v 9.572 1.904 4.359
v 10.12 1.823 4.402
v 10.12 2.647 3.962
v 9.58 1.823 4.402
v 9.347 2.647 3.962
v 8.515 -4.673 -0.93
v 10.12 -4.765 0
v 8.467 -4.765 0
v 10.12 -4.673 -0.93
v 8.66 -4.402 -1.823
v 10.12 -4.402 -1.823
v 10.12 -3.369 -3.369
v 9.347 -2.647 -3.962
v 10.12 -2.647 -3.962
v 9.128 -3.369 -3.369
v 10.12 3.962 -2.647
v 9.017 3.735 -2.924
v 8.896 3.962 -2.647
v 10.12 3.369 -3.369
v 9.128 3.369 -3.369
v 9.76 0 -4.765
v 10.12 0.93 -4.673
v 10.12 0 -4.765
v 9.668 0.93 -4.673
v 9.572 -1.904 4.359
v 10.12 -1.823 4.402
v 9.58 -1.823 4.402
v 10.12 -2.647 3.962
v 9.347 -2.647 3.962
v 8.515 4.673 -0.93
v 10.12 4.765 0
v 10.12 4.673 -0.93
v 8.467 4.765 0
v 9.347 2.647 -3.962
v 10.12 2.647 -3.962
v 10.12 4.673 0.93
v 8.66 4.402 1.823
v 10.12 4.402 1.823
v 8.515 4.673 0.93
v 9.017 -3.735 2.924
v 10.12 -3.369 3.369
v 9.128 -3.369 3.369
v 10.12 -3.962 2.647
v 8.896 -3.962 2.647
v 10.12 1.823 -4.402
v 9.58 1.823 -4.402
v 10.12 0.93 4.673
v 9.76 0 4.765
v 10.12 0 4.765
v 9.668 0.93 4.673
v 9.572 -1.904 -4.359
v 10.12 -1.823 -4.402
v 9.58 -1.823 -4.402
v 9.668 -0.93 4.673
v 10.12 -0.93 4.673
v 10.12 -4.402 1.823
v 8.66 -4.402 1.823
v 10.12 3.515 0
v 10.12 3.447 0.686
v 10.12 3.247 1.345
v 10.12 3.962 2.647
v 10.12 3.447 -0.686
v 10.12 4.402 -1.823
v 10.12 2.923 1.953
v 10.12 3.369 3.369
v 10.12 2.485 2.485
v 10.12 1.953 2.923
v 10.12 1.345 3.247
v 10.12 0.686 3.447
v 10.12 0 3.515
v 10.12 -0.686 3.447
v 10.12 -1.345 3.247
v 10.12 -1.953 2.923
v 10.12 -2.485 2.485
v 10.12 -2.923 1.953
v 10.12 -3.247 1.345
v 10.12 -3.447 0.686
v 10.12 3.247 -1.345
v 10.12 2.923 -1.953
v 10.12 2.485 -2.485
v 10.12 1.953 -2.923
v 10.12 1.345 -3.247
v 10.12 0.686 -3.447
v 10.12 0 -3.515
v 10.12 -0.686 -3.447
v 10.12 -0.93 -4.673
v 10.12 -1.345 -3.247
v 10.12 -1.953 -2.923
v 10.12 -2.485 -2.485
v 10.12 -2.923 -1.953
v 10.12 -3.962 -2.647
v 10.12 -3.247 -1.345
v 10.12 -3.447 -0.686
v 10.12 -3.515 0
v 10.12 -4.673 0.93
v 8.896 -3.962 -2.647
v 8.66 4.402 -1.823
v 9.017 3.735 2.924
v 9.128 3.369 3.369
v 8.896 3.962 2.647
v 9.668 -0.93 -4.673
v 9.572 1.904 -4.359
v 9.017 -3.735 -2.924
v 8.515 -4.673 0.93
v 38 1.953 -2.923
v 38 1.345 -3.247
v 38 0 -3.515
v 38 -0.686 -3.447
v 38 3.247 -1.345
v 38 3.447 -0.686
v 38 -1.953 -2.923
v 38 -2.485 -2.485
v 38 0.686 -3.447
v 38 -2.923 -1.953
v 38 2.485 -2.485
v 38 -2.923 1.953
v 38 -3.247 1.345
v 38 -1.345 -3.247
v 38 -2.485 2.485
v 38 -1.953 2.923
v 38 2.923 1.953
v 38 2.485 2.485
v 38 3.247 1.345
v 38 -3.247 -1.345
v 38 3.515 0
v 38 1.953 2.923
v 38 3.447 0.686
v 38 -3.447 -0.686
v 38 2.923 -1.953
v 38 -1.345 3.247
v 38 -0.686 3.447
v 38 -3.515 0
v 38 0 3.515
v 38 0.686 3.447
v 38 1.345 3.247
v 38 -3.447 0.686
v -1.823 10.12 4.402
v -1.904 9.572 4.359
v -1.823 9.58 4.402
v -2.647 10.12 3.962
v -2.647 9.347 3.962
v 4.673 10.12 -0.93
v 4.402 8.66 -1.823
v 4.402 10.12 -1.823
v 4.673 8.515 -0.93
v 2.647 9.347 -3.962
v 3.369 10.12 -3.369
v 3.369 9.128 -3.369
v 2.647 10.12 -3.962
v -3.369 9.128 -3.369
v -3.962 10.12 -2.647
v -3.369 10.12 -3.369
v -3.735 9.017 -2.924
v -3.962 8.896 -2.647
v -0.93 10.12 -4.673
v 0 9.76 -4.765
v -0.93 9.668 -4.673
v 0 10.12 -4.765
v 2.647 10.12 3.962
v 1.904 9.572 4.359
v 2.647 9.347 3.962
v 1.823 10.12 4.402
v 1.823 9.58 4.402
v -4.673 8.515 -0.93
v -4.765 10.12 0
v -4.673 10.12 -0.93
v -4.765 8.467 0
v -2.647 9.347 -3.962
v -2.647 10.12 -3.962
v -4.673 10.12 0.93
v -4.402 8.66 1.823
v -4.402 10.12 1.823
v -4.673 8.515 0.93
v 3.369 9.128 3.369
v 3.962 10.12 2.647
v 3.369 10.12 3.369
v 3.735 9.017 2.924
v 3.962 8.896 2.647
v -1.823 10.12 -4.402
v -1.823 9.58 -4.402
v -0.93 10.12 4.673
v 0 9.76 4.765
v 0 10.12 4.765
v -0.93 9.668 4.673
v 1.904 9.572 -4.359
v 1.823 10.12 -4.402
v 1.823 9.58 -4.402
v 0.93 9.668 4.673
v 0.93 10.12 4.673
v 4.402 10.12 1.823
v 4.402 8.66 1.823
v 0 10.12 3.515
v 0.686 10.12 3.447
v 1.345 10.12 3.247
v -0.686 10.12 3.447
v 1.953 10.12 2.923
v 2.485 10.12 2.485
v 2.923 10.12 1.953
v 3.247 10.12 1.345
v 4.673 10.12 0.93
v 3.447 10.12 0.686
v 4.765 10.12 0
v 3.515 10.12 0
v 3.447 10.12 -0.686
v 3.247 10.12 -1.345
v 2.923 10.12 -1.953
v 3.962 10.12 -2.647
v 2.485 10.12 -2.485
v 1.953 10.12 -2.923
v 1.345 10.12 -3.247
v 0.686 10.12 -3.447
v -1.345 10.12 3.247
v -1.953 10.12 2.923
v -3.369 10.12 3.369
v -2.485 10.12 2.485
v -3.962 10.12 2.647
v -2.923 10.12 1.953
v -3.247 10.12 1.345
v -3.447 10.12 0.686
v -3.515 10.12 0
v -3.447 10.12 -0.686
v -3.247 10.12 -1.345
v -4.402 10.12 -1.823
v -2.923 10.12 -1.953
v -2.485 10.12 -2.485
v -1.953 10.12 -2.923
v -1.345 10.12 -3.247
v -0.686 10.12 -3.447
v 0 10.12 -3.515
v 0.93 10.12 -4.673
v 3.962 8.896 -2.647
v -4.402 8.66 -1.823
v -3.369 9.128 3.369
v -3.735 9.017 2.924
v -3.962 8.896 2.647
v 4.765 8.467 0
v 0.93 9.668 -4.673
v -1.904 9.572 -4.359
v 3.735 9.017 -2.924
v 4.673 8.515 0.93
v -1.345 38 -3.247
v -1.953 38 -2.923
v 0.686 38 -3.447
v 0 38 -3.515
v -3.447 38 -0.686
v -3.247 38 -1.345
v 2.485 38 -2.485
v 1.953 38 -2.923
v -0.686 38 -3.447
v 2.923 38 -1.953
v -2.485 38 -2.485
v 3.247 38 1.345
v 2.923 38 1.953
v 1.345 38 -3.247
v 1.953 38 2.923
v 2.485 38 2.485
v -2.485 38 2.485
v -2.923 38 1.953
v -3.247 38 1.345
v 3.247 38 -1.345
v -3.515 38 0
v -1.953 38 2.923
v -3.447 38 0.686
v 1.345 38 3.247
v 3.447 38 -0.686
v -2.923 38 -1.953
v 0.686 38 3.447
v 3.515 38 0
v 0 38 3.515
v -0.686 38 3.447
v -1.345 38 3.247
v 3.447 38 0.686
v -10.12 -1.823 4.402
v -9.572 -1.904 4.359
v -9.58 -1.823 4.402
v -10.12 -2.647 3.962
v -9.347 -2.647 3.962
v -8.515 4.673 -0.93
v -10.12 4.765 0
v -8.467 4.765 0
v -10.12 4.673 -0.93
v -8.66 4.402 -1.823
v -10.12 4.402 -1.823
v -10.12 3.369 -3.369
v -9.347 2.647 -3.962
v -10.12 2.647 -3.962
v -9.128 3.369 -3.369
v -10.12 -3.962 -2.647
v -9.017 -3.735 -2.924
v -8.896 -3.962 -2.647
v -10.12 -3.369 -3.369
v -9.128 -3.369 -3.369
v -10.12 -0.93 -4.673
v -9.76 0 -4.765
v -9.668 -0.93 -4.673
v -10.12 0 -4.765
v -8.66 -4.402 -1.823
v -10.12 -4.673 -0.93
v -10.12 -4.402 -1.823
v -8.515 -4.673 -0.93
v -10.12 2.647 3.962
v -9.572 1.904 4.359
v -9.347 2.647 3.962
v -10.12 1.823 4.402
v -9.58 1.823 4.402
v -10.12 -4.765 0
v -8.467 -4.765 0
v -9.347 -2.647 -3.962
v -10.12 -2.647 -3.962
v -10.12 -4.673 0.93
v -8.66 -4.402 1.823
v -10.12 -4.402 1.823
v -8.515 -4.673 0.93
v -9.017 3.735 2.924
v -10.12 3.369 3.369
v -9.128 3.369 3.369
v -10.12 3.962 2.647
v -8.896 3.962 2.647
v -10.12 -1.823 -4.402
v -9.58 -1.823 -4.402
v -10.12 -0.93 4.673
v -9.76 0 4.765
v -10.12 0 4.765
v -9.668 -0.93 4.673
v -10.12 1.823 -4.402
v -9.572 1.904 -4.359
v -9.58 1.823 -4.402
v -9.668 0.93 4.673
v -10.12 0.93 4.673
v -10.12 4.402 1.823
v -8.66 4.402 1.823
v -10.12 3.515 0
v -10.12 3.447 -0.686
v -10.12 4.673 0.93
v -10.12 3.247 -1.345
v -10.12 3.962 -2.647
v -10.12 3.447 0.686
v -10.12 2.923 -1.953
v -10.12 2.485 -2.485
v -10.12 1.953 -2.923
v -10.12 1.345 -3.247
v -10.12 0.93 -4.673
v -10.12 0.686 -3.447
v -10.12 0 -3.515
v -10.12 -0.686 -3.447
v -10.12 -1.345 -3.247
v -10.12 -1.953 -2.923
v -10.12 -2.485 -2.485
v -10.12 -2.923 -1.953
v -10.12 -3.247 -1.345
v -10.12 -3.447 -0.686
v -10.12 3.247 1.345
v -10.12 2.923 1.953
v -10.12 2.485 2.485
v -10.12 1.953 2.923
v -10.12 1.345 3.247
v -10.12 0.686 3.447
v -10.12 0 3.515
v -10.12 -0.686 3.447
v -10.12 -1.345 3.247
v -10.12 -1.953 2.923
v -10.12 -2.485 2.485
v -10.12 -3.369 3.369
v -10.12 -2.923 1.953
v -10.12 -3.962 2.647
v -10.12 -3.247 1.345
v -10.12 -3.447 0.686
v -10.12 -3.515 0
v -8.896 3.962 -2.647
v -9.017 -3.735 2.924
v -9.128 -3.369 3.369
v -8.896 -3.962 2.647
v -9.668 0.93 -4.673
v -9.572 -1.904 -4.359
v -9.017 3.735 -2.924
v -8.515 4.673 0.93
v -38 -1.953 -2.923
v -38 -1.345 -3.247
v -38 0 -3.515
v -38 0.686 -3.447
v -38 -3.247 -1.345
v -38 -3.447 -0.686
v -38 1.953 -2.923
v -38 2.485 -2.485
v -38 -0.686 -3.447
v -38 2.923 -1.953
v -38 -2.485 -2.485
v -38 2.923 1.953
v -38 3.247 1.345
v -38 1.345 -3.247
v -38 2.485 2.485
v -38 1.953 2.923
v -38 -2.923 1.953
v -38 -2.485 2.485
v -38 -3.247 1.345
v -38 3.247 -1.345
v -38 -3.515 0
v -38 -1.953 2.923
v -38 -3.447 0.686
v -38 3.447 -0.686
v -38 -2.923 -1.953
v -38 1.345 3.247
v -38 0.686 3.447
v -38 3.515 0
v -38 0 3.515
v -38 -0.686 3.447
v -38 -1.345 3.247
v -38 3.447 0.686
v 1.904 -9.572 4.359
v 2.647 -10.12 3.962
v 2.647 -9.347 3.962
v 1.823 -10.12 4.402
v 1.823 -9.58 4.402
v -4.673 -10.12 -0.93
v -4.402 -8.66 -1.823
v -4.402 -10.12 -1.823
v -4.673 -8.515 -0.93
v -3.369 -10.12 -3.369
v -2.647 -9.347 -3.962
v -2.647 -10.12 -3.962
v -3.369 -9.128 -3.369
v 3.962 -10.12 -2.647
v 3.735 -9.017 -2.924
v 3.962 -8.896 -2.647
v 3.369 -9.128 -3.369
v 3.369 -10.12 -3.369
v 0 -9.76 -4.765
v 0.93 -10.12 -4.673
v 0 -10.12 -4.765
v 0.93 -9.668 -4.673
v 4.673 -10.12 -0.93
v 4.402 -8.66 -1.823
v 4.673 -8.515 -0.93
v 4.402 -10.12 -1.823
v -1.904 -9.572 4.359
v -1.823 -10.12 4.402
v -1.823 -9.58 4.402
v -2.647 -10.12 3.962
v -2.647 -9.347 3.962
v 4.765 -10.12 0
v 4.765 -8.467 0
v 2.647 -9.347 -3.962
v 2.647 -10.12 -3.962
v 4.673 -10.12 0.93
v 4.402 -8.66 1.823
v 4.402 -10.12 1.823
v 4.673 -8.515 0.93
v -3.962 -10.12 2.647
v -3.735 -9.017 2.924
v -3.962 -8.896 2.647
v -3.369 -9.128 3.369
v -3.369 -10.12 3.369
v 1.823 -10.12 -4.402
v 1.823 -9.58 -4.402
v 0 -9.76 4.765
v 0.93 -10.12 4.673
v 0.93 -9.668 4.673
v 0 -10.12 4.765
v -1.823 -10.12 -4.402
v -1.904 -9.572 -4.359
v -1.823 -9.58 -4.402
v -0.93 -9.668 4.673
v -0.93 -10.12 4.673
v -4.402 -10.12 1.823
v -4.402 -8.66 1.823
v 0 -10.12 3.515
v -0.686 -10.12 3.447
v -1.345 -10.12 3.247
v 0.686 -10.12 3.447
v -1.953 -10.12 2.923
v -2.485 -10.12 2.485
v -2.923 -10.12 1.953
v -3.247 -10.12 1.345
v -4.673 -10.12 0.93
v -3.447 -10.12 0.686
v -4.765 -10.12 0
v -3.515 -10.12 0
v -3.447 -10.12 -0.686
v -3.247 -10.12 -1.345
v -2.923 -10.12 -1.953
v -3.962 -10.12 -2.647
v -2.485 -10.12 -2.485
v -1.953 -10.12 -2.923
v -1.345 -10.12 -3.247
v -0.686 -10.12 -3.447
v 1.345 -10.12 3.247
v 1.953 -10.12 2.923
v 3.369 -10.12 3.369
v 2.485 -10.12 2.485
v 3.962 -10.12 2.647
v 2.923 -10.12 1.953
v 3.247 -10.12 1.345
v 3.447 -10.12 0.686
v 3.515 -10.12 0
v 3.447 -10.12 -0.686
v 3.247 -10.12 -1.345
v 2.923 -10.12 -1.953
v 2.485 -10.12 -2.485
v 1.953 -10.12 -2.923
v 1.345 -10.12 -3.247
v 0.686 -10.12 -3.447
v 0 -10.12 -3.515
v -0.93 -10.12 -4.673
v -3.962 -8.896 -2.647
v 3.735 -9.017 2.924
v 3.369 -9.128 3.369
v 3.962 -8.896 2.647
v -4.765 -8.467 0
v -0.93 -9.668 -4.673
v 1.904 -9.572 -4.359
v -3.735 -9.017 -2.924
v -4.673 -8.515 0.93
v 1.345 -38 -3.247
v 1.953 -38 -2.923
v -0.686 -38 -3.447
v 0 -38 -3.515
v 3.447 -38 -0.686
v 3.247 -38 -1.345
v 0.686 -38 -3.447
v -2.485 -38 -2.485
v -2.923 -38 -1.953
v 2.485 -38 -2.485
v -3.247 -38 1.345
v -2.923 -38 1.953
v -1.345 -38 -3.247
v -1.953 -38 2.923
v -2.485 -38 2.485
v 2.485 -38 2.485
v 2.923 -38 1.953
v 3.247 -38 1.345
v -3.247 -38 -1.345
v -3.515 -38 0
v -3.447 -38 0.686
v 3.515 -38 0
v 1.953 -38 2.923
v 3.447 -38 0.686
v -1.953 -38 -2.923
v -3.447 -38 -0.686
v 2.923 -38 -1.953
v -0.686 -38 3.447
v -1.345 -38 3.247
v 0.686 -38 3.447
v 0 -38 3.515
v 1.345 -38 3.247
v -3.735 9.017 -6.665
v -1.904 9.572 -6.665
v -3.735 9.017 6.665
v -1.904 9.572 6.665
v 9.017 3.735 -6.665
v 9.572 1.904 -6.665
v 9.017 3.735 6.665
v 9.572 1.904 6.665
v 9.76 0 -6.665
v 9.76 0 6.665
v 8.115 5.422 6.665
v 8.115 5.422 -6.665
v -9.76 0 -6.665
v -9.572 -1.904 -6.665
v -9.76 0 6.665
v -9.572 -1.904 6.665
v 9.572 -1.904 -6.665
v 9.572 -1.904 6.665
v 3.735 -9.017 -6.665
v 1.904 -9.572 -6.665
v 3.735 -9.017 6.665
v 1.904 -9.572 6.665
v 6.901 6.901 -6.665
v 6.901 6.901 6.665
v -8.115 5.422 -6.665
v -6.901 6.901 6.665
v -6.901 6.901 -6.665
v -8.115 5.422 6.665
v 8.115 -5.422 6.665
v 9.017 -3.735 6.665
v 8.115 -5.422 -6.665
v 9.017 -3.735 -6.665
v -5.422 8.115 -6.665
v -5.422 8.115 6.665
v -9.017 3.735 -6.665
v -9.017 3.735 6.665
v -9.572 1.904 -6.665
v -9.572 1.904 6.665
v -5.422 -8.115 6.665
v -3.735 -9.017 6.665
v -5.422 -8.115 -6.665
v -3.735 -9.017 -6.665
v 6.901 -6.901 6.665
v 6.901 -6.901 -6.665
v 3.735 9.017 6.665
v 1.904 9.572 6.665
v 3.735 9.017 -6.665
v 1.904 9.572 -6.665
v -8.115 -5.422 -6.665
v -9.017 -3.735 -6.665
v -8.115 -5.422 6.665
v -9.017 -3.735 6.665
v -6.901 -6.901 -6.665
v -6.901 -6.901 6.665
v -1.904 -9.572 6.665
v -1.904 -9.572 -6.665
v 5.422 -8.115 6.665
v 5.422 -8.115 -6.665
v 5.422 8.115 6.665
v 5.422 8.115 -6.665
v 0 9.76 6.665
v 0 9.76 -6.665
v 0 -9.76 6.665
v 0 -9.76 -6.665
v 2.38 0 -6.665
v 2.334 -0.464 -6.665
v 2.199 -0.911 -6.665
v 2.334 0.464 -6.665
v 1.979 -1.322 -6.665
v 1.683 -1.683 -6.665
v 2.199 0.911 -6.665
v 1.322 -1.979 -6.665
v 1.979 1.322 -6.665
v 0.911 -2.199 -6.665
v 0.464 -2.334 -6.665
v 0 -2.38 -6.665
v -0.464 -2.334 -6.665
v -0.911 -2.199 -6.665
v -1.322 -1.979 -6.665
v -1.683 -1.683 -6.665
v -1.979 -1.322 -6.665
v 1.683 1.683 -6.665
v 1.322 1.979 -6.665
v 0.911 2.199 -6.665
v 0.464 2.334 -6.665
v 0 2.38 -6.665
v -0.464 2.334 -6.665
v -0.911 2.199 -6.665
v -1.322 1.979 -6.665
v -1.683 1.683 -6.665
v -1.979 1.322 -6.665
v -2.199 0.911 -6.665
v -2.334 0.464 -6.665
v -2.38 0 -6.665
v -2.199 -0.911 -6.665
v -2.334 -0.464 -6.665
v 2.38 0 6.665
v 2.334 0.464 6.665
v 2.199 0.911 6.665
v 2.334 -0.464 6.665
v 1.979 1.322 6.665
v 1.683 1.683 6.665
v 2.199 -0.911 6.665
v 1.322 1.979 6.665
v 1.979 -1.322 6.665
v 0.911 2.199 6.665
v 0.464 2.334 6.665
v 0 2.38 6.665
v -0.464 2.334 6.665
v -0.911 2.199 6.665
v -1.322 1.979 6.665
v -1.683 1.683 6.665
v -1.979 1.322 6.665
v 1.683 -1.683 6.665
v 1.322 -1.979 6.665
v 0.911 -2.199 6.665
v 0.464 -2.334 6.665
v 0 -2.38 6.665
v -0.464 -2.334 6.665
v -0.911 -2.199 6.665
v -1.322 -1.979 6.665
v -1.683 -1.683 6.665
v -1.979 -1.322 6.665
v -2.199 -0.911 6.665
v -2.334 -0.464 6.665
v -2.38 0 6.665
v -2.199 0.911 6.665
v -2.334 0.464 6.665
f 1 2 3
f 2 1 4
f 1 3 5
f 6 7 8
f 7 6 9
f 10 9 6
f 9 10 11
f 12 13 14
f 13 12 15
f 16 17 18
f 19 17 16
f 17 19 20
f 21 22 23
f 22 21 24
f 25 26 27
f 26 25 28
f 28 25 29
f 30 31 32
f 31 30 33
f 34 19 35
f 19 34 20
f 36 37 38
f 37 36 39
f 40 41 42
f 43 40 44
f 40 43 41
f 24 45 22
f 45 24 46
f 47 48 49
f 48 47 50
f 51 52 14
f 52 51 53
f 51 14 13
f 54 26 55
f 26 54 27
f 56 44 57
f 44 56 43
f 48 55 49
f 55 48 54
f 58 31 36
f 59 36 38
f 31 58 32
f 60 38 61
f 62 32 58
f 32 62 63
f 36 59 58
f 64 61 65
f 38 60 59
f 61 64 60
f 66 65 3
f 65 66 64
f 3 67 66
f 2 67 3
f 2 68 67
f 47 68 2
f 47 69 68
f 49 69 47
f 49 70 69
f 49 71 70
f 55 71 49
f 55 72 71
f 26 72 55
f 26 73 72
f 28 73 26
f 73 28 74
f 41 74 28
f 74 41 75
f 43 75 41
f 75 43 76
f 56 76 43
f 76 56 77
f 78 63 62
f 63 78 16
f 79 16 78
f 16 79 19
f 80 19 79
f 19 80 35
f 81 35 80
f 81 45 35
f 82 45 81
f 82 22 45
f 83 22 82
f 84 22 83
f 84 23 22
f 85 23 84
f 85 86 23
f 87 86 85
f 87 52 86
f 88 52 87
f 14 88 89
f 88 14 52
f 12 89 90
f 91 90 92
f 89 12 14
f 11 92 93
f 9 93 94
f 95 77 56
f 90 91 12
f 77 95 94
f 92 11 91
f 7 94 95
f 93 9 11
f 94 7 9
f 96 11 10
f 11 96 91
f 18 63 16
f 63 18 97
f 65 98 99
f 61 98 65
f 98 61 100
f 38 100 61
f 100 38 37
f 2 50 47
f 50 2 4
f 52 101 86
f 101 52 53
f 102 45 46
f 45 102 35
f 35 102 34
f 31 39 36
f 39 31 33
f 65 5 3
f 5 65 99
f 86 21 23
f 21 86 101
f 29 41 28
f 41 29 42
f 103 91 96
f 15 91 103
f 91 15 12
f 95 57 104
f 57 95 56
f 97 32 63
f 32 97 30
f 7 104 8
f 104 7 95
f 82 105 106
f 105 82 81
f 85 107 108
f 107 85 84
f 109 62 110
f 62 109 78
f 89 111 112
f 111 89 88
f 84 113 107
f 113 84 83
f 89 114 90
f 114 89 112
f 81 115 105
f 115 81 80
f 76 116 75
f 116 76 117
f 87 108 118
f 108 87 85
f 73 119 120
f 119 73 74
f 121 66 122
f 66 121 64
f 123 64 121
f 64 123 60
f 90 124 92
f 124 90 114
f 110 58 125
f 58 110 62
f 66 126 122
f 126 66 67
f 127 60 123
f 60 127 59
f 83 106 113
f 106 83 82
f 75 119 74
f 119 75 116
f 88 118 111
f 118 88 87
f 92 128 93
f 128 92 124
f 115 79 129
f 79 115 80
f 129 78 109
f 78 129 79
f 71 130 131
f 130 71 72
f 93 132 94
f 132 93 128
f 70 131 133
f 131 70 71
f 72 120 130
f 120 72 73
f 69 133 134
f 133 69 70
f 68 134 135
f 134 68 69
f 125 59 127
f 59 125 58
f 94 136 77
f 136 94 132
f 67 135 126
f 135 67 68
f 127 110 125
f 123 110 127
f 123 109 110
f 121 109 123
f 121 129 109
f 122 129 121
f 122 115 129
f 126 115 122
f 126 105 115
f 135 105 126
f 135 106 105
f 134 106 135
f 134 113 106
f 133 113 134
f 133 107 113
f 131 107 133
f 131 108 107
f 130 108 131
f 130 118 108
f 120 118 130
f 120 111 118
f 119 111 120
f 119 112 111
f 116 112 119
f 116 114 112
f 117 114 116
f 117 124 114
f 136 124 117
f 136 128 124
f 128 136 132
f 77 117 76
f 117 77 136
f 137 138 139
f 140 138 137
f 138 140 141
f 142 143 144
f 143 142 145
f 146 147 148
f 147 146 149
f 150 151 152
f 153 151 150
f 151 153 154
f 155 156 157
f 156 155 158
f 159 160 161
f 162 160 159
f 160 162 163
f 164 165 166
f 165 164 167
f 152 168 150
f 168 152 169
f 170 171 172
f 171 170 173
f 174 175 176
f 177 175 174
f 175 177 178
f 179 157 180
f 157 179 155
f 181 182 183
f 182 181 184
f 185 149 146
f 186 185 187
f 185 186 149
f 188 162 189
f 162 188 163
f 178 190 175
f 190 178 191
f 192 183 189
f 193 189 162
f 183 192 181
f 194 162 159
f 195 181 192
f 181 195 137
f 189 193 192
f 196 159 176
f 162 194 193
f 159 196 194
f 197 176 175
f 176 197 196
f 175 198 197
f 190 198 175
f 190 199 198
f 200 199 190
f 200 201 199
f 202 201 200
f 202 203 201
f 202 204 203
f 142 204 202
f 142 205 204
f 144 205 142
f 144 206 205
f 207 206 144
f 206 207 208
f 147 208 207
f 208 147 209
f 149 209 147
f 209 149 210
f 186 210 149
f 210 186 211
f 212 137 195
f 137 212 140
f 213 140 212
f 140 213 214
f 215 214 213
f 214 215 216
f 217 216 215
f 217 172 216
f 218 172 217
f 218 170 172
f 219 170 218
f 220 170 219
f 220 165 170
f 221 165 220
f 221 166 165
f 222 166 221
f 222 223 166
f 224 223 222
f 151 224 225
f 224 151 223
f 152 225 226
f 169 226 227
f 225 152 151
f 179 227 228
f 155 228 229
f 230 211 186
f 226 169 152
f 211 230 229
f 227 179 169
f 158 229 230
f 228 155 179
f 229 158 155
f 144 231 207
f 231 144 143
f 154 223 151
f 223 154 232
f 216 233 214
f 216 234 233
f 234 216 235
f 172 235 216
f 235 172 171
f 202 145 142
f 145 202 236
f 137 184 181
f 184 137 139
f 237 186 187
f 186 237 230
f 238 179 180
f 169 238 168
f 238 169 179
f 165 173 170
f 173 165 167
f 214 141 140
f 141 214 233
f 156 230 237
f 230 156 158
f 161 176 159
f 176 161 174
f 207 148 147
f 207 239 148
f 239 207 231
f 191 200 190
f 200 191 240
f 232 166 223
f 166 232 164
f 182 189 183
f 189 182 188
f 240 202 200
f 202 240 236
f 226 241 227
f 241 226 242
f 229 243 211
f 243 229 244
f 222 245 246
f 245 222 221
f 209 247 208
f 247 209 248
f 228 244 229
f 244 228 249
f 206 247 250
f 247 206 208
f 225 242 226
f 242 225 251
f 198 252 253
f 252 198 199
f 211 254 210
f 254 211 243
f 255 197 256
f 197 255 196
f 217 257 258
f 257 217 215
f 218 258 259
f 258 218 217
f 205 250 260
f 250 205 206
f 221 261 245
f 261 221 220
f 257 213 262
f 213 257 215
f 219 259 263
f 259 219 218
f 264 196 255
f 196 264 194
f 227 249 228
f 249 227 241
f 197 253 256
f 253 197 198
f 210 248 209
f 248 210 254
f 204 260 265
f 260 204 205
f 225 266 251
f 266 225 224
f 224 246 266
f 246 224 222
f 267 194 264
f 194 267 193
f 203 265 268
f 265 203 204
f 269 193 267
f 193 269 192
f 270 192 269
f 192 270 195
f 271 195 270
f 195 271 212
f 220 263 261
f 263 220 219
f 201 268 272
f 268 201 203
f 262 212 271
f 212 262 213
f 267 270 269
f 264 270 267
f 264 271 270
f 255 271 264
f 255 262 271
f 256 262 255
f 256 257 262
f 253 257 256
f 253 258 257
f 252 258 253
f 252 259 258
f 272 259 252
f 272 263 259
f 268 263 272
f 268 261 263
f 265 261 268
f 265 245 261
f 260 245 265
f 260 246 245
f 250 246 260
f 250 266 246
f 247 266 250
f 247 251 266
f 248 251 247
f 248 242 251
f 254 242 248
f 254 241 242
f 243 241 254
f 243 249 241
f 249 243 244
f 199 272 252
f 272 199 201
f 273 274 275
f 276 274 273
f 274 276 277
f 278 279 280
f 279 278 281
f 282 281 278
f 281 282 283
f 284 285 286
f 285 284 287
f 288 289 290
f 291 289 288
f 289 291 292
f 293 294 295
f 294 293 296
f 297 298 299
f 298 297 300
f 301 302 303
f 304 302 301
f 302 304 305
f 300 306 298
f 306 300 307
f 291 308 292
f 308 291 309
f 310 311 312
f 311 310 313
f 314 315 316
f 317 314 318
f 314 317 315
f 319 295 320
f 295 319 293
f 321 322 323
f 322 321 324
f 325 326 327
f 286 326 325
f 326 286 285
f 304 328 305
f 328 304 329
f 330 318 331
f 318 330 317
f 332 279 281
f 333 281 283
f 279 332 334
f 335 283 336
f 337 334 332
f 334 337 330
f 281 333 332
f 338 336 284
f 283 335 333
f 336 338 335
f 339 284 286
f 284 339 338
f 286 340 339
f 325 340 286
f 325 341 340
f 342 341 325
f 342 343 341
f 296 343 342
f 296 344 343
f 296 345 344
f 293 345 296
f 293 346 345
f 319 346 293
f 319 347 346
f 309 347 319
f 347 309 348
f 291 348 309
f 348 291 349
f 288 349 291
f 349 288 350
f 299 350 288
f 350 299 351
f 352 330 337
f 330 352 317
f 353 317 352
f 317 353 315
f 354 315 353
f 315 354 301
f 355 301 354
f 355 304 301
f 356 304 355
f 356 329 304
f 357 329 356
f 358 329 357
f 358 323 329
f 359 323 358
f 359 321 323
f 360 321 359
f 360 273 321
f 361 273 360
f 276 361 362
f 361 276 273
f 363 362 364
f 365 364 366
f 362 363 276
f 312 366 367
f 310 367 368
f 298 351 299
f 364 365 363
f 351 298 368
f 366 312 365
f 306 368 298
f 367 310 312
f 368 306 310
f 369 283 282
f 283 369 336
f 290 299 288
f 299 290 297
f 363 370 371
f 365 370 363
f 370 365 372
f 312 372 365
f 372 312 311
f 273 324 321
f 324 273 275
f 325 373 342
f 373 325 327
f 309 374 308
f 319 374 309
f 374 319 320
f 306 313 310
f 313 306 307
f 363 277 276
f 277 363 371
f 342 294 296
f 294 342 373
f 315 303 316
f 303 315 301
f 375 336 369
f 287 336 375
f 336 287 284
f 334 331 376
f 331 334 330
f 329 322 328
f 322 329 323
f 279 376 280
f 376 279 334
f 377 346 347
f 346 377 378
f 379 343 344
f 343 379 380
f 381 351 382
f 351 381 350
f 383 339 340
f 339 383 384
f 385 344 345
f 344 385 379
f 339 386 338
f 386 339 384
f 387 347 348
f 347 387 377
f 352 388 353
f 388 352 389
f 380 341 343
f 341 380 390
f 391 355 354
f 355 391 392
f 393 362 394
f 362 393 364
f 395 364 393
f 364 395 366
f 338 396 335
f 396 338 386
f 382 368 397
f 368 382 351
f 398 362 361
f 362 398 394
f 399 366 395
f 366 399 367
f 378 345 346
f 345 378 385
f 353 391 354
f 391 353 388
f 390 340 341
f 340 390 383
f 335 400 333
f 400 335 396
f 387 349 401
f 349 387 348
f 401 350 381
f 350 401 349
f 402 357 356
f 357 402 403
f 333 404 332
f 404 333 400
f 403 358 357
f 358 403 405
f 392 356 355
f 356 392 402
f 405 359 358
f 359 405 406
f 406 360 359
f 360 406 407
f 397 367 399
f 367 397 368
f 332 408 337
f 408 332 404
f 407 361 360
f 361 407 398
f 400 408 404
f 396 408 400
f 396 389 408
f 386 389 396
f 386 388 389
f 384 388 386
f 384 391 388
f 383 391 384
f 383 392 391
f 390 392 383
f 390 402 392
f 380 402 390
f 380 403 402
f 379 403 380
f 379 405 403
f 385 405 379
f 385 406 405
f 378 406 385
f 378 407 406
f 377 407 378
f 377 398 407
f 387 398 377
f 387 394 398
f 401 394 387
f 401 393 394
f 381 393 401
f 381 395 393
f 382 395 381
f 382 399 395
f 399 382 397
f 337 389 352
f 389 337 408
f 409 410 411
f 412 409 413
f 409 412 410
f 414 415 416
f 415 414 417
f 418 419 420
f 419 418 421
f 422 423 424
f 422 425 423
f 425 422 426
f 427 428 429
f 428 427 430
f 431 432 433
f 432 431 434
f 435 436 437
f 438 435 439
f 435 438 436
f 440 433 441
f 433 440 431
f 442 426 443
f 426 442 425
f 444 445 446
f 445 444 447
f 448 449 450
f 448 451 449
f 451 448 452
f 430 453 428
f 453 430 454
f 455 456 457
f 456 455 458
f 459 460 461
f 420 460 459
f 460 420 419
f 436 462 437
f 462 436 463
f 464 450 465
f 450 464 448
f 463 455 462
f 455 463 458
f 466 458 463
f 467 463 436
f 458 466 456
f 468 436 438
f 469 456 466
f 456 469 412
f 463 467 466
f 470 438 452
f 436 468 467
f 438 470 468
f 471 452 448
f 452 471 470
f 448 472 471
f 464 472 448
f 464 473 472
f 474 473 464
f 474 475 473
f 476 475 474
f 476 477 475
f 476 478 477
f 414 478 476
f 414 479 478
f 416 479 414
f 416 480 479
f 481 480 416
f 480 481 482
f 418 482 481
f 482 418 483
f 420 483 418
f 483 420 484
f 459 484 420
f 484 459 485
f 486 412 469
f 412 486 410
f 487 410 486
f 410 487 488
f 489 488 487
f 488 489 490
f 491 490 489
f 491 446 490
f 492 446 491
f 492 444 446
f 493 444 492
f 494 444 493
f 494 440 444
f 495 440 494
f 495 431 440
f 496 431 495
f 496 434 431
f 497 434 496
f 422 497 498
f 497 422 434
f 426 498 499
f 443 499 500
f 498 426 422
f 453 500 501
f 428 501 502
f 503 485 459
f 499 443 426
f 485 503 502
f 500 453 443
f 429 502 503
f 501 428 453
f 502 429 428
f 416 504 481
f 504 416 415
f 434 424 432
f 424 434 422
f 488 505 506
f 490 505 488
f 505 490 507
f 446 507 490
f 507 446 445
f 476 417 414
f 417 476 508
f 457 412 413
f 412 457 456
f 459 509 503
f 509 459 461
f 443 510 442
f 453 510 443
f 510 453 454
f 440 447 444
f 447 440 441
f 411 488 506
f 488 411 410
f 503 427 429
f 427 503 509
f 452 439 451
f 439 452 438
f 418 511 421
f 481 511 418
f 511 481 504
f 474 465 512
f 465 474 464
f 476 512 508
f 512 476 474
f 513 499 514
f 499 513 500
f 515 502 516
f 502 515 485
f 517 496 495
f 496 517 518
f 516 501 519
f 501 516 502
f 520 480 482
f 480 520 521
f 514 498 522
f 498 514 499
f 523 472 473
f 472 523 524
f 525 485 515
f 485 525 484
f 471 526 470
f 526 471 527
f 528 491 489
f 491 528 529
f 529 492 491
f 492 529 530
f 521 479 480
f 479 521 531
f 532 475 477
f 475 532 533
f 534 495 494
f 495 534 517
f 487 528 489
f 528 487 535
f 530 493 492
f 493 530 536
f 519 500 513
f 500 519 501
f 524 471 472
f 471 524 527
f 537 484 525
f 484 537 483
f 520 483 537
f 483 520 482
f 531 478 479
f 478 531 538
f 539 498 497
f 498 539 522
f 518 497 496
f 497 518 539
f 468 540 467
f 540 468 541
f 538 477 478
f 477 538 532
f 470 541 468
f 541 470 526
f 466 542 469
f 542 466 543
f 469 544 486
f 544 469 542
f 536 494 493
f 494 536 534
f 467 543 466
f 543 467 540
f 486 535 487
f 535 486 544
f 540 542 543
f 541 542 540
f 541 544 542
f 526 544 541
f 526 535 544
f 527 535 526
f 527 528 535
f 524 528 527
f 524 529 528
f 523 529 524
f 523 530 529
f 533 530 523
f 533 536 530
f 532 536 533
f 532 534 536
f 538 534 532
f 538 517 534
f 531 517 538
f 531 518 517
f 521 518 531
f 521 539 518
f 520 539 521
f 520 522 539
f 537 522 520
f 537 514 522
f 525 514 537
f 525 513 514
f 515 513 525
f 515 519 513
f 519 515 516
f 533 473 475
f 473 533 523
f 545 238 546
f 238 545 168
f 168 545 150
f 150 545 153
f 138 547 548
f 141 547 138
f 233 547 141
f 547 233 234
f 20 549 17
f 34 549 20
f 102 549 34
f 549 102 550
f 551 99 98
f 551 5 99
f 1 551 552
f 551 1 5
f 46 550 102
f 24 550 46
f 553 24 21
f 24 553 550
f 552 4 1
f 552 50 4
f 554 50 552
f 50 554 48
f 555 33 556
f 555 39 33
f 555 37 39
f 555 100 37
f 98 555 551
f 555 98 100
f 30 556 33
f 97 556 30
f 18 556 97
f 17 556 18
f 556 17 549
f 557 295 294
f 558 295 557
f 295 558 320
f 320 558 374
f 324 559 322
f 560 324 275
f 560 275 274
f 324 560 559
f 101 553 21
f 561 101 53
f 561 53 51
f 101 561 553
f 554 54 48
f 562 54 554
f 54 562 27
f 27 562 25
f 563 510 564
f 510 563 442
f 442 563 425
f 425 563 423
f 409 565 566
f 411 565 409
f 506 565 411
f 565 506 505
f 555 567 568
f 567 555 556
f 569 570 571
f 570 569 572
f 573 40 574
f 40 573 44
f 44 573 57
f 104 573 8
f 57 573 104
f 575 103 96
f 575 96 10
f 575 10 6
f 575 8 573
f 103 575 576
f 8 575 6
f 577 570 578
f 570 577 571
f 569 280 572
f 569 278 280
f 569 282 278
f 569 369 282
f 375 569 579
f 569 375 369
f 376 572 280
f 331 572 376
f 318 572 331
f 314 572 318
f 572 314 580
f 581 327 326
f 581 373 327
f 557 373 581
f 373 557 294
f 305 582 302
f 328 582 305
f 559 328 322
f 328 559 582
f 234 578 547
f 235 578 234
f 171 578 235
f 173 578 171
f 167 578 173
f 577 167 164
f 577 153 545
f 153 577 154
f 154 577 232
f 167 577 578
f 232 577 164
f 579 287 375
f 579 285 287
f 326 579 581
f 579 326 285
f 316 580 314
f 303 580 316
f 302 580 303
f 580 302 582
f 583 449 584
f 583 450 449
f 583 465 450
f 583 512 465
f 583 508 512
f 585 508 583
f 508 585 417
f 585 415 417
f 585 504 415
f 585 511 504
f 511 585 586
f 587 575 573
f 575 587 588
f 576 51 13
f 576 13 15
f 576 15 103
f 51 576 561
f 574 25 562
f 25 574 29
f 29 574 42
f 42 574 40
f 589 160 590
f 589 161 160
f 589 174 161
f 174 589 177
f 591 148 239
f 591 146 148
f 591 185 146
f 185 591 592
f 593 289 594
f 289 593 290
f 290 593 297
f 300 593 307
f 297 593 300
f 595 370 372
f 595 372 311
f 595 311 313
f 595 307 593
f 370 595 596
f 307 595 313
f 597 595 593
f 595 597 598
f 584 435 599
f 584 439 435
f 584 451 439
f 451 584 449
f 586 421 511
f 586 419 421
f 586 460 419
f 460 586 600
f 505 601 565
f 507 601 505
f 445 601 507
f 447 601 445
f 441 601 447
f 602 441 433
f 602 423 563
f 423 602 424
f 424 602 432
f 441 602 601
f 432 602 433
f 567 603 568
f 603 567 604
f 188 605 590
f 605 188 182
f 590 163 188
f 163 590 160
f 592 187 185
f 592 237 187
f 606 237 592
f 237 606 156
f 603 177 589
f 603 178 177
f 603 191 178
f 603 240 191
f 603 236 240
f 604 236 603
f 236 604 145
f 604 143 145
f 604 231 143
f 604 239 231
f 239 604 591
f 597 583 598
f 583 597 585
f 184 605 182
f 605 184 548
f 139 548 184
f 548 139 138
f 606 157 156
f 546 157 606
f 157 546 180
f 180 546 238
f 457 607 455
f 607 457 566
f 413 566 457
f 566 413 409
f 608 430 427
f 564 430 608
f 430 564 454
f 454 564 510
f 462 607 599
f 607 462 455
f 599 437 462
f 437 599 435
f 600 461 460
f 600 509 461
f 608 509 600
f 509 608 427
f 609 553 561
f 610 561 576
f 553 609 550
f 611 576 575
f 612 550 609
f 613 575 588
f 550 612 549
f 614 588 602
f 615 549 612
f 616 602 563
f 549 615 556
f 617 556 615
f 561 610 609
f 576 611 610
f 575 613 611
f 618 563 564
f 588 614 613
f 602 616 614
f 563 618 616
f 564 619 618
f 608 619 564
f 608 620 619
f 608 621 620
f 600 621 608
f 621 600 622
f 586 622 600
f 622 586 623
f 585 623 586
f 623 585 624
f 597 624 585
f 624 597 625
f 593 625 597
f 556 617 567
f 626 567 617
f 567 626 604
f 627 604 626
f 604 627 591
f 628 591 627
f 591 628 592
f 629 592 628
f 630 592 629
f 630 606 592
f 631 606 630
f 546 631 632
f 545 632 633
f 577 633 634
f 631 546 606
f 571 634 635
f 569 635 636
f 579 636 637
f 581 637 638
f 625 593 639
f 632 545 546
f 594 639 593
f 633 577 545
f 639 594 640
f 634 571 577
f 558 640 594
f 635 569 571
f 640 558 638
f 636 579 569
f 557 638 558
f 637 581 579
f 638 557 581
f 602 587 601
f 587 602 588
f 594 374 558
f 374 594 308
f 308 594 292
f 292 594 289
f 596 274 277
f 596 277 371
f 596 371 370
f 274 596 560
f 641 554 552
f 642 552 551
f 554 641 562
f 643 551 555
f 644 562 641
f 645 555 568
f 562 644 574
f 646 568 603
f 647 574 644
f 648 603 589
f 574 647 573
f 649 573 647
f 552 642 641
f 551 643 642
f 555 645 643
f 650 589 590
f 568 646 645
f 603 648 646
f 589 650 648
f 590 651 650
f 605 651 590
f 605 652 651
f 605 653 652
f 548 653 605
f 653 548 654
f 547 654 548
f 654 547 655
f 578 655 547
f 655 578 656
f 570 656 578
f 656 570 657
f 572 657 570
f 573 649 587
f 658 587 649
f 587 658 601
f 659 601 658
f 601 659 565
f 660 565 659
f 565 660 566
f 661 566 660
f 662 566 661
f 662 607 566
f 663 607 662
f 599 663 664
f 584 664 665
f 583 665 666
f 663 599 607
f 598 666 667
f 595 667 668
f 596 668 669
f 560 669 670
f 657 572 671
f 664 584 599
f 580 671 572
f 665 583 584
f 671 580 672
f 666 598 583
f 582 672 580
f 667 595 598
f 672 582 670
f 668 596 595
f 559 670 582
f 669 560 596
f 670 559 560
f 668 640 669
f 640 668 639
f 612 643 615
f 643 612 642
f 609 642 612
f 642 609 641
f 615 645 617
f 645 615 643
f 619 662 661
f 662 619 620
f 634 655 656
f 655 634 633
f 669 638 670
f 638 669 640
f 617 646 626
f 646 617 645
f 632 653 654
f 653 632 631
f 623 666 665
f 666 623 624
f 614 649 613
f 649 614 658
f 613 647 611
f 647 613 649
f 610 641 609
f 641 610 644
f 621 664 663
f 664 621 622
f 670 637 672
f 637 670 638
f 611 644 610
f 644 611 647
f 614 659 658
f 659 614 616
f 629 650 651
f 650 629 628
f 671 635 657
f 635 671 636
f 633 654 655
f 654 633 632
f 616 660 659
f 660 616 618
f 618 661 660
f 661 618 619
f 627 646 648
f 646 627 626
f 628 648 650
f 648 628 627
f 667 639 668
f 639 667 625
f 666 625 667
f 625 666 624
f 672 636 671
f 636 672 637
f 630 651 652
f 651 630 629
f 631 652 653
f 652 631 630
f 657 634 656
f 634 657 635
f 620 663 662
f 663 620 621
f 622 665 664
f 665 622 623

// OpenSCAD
$fn = 32;

// ----------------------------------------------------------------------
// Cardan cross: 76 mm span, 9.53 mm trunnions
// ----------------------------------------------------------------------

// --- parameters (mm) ---
journal_d = 9.53;         // trunnion diameter
arm_len = 38;             // trunnion length from the centre
step_r = 3.24;            // step position from the centre
step_d = 7.03;            // journal diameter after the step
hub_d = 19.52;            // hub diameter
hub_h = 13.33;            // hub height
bore_d = 4.76;            // hub bore

difference() {
  union() {
    /* hub along the joint axis */
    cylinder(h = hub_h, d = hub_d, center = true);
    for (a = [0 : 90 : 270]) rotate([0, 0, a]) {
      /* trunnion, sunk into the hub */
      translate([hub_d / 4, 0, 0]) rotate([0, 90, 0]) cylinder(h = step_r + 2, d = journal_d);
      /* stepped journal out to the tip */
      translate([step_r - 0.5, 0, 0]) rotate([0, 90, 0]) cylinder(h = arm_len + 0.5 - step_r, d = step_d);
    }
  }
  /* lubrication bore through the hub, 2.5 mm clear on both sides */
  translate([0, 0, -hub_h / 2 - 2.5]) cylinder(h = hub_h + 5, d = bore_d);
}
